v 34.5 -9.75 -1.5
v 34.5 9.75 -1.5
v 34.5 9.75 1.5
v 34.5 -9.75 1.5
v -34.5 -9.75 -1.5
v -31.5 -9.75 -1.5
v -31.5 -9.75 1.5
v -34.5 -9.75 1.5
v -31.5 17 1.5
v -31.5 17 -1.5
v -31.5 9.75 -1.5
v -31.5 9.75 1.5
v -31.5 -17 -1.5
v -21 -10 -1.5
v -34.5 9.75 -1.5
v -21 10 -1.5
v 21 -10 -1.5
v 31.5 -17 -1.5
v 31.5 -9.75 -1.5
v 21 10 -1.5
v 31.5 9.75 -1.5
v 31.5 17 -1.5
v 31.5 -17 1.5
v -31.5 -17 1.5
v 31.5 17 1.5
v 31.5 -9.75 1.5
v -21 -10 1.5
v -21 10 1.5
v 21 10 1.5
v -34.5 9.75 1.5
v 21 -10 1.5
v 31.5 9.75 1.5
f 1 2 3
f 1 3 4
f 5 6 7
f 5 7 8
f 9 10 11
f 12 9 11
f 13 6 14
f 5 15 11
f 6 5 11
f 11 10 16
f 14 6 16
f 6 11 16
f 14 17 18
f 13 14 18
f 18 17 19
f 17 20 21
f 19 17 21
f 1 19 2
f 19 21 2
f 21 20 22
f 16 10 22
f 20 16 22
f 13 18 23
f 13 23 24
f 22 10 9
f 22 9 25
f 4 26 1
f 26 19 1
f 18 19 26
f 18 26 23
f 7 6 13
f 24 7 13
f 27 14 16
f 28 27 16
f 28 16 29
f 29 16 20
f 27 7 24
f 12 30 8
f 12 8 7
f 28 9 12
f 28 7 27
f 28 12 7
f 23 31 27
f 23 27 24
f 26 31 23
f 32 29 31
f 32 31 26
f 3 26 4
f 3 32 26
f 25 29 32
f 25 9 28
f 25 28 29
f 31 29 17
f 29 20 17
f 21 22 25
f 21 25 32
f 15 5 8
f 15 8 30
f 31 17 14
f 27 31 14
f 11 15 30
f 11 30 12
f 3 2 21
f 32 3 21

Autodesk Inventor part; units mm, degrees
ref_plane "YZ Plane" through (0, 0, 0) normal (1, 0, 0) x (0, 1, 0)
ref_plane "XZ Plane" through (0, 0, 0) normal (0, 1, 0) x (-1, 0, 0)
ref_plane "XY Plane" through (0, 0, 0) normal (0, 0, 1) x (1, 0, 0)
sketch "Sketch1" plane through (0, 0, 0) normal (0, 0, 1) x (1, 0, 0)
  line L0 (-34.5, 17) -> (34.5, 17)
  line L1 (34.5, 17) -> (34.5, -17)
  line L2 (34.5, -17) -> (-34.5, -17)
  line L3 (-34.5, -17) -> (-34.5, 17)
  line L4 (34.5, 9.75) -> (31.5, 9.75)
  line L5 (31.5, 9.75) -> (31.5, -9.75)
  line L6 (31.5, -9.75) -> (34.5, -9.75)
  line L7 (34.5, -9.75) -> (34.5, 9.75)
  line L8 (-21, 10) -> (21, 10)
  line L9 (21, 10) -> (21, -10)
  line L10 (21, -10) -> (-21, -10)
  line L11 (-21, -10) -> (-21, 10)
  line L12 (0, 31.4058) -> (0, -31.4058)
  line L13 (31.5, 17) -> (31.5, 9.75)
  line L14 (31.5, -9.75) -> (31.5, -17)
  line L15 (-34.5, 17) -> (-34.5, -17)
  line L16 (-34.5, 9.75) -> (-31.5, 9.75)
  line L17 (-31.5, 9.75) -> (-31.5, -9.75)
  line L18 (-31.5, -9.75) -> (-34.5, -9.75)
  line L19 (-31.5, 17) -> (-31.5, 9.75)
  line L20 (-31.5, -9.75) -> (-31.5, -17)
  point P0 (0, 0)
  point P1 (34.5, 0)
  point P2 (0, 17)
  point P3 (34.5, 0)
  point P4 (21, 0)
  point P5 (0, 10)
  point P6 (-31, 17)
  point P7 (-31, -17)
  point P8 (31.5, -17)
  point P9 (0, 0)
  dimension "d0" = 34
  dimension "d1" = 19.5
  dimension "d2" = 3
  dimension "d3" = 20
  dimension "d4" = 69
  dimension "d5" = 42
extrude "Extrusion1" add sketch "Sketch1" along normal mid plane 3 contours L0 L12 L8 L11 L10 L2 L20 L17 L19 | L16 L17 L18 L3 | L0 L13 L5 L14 L2 L12 L10 L9 L8 | L4 L1 L6 L5
properties part number "C"
